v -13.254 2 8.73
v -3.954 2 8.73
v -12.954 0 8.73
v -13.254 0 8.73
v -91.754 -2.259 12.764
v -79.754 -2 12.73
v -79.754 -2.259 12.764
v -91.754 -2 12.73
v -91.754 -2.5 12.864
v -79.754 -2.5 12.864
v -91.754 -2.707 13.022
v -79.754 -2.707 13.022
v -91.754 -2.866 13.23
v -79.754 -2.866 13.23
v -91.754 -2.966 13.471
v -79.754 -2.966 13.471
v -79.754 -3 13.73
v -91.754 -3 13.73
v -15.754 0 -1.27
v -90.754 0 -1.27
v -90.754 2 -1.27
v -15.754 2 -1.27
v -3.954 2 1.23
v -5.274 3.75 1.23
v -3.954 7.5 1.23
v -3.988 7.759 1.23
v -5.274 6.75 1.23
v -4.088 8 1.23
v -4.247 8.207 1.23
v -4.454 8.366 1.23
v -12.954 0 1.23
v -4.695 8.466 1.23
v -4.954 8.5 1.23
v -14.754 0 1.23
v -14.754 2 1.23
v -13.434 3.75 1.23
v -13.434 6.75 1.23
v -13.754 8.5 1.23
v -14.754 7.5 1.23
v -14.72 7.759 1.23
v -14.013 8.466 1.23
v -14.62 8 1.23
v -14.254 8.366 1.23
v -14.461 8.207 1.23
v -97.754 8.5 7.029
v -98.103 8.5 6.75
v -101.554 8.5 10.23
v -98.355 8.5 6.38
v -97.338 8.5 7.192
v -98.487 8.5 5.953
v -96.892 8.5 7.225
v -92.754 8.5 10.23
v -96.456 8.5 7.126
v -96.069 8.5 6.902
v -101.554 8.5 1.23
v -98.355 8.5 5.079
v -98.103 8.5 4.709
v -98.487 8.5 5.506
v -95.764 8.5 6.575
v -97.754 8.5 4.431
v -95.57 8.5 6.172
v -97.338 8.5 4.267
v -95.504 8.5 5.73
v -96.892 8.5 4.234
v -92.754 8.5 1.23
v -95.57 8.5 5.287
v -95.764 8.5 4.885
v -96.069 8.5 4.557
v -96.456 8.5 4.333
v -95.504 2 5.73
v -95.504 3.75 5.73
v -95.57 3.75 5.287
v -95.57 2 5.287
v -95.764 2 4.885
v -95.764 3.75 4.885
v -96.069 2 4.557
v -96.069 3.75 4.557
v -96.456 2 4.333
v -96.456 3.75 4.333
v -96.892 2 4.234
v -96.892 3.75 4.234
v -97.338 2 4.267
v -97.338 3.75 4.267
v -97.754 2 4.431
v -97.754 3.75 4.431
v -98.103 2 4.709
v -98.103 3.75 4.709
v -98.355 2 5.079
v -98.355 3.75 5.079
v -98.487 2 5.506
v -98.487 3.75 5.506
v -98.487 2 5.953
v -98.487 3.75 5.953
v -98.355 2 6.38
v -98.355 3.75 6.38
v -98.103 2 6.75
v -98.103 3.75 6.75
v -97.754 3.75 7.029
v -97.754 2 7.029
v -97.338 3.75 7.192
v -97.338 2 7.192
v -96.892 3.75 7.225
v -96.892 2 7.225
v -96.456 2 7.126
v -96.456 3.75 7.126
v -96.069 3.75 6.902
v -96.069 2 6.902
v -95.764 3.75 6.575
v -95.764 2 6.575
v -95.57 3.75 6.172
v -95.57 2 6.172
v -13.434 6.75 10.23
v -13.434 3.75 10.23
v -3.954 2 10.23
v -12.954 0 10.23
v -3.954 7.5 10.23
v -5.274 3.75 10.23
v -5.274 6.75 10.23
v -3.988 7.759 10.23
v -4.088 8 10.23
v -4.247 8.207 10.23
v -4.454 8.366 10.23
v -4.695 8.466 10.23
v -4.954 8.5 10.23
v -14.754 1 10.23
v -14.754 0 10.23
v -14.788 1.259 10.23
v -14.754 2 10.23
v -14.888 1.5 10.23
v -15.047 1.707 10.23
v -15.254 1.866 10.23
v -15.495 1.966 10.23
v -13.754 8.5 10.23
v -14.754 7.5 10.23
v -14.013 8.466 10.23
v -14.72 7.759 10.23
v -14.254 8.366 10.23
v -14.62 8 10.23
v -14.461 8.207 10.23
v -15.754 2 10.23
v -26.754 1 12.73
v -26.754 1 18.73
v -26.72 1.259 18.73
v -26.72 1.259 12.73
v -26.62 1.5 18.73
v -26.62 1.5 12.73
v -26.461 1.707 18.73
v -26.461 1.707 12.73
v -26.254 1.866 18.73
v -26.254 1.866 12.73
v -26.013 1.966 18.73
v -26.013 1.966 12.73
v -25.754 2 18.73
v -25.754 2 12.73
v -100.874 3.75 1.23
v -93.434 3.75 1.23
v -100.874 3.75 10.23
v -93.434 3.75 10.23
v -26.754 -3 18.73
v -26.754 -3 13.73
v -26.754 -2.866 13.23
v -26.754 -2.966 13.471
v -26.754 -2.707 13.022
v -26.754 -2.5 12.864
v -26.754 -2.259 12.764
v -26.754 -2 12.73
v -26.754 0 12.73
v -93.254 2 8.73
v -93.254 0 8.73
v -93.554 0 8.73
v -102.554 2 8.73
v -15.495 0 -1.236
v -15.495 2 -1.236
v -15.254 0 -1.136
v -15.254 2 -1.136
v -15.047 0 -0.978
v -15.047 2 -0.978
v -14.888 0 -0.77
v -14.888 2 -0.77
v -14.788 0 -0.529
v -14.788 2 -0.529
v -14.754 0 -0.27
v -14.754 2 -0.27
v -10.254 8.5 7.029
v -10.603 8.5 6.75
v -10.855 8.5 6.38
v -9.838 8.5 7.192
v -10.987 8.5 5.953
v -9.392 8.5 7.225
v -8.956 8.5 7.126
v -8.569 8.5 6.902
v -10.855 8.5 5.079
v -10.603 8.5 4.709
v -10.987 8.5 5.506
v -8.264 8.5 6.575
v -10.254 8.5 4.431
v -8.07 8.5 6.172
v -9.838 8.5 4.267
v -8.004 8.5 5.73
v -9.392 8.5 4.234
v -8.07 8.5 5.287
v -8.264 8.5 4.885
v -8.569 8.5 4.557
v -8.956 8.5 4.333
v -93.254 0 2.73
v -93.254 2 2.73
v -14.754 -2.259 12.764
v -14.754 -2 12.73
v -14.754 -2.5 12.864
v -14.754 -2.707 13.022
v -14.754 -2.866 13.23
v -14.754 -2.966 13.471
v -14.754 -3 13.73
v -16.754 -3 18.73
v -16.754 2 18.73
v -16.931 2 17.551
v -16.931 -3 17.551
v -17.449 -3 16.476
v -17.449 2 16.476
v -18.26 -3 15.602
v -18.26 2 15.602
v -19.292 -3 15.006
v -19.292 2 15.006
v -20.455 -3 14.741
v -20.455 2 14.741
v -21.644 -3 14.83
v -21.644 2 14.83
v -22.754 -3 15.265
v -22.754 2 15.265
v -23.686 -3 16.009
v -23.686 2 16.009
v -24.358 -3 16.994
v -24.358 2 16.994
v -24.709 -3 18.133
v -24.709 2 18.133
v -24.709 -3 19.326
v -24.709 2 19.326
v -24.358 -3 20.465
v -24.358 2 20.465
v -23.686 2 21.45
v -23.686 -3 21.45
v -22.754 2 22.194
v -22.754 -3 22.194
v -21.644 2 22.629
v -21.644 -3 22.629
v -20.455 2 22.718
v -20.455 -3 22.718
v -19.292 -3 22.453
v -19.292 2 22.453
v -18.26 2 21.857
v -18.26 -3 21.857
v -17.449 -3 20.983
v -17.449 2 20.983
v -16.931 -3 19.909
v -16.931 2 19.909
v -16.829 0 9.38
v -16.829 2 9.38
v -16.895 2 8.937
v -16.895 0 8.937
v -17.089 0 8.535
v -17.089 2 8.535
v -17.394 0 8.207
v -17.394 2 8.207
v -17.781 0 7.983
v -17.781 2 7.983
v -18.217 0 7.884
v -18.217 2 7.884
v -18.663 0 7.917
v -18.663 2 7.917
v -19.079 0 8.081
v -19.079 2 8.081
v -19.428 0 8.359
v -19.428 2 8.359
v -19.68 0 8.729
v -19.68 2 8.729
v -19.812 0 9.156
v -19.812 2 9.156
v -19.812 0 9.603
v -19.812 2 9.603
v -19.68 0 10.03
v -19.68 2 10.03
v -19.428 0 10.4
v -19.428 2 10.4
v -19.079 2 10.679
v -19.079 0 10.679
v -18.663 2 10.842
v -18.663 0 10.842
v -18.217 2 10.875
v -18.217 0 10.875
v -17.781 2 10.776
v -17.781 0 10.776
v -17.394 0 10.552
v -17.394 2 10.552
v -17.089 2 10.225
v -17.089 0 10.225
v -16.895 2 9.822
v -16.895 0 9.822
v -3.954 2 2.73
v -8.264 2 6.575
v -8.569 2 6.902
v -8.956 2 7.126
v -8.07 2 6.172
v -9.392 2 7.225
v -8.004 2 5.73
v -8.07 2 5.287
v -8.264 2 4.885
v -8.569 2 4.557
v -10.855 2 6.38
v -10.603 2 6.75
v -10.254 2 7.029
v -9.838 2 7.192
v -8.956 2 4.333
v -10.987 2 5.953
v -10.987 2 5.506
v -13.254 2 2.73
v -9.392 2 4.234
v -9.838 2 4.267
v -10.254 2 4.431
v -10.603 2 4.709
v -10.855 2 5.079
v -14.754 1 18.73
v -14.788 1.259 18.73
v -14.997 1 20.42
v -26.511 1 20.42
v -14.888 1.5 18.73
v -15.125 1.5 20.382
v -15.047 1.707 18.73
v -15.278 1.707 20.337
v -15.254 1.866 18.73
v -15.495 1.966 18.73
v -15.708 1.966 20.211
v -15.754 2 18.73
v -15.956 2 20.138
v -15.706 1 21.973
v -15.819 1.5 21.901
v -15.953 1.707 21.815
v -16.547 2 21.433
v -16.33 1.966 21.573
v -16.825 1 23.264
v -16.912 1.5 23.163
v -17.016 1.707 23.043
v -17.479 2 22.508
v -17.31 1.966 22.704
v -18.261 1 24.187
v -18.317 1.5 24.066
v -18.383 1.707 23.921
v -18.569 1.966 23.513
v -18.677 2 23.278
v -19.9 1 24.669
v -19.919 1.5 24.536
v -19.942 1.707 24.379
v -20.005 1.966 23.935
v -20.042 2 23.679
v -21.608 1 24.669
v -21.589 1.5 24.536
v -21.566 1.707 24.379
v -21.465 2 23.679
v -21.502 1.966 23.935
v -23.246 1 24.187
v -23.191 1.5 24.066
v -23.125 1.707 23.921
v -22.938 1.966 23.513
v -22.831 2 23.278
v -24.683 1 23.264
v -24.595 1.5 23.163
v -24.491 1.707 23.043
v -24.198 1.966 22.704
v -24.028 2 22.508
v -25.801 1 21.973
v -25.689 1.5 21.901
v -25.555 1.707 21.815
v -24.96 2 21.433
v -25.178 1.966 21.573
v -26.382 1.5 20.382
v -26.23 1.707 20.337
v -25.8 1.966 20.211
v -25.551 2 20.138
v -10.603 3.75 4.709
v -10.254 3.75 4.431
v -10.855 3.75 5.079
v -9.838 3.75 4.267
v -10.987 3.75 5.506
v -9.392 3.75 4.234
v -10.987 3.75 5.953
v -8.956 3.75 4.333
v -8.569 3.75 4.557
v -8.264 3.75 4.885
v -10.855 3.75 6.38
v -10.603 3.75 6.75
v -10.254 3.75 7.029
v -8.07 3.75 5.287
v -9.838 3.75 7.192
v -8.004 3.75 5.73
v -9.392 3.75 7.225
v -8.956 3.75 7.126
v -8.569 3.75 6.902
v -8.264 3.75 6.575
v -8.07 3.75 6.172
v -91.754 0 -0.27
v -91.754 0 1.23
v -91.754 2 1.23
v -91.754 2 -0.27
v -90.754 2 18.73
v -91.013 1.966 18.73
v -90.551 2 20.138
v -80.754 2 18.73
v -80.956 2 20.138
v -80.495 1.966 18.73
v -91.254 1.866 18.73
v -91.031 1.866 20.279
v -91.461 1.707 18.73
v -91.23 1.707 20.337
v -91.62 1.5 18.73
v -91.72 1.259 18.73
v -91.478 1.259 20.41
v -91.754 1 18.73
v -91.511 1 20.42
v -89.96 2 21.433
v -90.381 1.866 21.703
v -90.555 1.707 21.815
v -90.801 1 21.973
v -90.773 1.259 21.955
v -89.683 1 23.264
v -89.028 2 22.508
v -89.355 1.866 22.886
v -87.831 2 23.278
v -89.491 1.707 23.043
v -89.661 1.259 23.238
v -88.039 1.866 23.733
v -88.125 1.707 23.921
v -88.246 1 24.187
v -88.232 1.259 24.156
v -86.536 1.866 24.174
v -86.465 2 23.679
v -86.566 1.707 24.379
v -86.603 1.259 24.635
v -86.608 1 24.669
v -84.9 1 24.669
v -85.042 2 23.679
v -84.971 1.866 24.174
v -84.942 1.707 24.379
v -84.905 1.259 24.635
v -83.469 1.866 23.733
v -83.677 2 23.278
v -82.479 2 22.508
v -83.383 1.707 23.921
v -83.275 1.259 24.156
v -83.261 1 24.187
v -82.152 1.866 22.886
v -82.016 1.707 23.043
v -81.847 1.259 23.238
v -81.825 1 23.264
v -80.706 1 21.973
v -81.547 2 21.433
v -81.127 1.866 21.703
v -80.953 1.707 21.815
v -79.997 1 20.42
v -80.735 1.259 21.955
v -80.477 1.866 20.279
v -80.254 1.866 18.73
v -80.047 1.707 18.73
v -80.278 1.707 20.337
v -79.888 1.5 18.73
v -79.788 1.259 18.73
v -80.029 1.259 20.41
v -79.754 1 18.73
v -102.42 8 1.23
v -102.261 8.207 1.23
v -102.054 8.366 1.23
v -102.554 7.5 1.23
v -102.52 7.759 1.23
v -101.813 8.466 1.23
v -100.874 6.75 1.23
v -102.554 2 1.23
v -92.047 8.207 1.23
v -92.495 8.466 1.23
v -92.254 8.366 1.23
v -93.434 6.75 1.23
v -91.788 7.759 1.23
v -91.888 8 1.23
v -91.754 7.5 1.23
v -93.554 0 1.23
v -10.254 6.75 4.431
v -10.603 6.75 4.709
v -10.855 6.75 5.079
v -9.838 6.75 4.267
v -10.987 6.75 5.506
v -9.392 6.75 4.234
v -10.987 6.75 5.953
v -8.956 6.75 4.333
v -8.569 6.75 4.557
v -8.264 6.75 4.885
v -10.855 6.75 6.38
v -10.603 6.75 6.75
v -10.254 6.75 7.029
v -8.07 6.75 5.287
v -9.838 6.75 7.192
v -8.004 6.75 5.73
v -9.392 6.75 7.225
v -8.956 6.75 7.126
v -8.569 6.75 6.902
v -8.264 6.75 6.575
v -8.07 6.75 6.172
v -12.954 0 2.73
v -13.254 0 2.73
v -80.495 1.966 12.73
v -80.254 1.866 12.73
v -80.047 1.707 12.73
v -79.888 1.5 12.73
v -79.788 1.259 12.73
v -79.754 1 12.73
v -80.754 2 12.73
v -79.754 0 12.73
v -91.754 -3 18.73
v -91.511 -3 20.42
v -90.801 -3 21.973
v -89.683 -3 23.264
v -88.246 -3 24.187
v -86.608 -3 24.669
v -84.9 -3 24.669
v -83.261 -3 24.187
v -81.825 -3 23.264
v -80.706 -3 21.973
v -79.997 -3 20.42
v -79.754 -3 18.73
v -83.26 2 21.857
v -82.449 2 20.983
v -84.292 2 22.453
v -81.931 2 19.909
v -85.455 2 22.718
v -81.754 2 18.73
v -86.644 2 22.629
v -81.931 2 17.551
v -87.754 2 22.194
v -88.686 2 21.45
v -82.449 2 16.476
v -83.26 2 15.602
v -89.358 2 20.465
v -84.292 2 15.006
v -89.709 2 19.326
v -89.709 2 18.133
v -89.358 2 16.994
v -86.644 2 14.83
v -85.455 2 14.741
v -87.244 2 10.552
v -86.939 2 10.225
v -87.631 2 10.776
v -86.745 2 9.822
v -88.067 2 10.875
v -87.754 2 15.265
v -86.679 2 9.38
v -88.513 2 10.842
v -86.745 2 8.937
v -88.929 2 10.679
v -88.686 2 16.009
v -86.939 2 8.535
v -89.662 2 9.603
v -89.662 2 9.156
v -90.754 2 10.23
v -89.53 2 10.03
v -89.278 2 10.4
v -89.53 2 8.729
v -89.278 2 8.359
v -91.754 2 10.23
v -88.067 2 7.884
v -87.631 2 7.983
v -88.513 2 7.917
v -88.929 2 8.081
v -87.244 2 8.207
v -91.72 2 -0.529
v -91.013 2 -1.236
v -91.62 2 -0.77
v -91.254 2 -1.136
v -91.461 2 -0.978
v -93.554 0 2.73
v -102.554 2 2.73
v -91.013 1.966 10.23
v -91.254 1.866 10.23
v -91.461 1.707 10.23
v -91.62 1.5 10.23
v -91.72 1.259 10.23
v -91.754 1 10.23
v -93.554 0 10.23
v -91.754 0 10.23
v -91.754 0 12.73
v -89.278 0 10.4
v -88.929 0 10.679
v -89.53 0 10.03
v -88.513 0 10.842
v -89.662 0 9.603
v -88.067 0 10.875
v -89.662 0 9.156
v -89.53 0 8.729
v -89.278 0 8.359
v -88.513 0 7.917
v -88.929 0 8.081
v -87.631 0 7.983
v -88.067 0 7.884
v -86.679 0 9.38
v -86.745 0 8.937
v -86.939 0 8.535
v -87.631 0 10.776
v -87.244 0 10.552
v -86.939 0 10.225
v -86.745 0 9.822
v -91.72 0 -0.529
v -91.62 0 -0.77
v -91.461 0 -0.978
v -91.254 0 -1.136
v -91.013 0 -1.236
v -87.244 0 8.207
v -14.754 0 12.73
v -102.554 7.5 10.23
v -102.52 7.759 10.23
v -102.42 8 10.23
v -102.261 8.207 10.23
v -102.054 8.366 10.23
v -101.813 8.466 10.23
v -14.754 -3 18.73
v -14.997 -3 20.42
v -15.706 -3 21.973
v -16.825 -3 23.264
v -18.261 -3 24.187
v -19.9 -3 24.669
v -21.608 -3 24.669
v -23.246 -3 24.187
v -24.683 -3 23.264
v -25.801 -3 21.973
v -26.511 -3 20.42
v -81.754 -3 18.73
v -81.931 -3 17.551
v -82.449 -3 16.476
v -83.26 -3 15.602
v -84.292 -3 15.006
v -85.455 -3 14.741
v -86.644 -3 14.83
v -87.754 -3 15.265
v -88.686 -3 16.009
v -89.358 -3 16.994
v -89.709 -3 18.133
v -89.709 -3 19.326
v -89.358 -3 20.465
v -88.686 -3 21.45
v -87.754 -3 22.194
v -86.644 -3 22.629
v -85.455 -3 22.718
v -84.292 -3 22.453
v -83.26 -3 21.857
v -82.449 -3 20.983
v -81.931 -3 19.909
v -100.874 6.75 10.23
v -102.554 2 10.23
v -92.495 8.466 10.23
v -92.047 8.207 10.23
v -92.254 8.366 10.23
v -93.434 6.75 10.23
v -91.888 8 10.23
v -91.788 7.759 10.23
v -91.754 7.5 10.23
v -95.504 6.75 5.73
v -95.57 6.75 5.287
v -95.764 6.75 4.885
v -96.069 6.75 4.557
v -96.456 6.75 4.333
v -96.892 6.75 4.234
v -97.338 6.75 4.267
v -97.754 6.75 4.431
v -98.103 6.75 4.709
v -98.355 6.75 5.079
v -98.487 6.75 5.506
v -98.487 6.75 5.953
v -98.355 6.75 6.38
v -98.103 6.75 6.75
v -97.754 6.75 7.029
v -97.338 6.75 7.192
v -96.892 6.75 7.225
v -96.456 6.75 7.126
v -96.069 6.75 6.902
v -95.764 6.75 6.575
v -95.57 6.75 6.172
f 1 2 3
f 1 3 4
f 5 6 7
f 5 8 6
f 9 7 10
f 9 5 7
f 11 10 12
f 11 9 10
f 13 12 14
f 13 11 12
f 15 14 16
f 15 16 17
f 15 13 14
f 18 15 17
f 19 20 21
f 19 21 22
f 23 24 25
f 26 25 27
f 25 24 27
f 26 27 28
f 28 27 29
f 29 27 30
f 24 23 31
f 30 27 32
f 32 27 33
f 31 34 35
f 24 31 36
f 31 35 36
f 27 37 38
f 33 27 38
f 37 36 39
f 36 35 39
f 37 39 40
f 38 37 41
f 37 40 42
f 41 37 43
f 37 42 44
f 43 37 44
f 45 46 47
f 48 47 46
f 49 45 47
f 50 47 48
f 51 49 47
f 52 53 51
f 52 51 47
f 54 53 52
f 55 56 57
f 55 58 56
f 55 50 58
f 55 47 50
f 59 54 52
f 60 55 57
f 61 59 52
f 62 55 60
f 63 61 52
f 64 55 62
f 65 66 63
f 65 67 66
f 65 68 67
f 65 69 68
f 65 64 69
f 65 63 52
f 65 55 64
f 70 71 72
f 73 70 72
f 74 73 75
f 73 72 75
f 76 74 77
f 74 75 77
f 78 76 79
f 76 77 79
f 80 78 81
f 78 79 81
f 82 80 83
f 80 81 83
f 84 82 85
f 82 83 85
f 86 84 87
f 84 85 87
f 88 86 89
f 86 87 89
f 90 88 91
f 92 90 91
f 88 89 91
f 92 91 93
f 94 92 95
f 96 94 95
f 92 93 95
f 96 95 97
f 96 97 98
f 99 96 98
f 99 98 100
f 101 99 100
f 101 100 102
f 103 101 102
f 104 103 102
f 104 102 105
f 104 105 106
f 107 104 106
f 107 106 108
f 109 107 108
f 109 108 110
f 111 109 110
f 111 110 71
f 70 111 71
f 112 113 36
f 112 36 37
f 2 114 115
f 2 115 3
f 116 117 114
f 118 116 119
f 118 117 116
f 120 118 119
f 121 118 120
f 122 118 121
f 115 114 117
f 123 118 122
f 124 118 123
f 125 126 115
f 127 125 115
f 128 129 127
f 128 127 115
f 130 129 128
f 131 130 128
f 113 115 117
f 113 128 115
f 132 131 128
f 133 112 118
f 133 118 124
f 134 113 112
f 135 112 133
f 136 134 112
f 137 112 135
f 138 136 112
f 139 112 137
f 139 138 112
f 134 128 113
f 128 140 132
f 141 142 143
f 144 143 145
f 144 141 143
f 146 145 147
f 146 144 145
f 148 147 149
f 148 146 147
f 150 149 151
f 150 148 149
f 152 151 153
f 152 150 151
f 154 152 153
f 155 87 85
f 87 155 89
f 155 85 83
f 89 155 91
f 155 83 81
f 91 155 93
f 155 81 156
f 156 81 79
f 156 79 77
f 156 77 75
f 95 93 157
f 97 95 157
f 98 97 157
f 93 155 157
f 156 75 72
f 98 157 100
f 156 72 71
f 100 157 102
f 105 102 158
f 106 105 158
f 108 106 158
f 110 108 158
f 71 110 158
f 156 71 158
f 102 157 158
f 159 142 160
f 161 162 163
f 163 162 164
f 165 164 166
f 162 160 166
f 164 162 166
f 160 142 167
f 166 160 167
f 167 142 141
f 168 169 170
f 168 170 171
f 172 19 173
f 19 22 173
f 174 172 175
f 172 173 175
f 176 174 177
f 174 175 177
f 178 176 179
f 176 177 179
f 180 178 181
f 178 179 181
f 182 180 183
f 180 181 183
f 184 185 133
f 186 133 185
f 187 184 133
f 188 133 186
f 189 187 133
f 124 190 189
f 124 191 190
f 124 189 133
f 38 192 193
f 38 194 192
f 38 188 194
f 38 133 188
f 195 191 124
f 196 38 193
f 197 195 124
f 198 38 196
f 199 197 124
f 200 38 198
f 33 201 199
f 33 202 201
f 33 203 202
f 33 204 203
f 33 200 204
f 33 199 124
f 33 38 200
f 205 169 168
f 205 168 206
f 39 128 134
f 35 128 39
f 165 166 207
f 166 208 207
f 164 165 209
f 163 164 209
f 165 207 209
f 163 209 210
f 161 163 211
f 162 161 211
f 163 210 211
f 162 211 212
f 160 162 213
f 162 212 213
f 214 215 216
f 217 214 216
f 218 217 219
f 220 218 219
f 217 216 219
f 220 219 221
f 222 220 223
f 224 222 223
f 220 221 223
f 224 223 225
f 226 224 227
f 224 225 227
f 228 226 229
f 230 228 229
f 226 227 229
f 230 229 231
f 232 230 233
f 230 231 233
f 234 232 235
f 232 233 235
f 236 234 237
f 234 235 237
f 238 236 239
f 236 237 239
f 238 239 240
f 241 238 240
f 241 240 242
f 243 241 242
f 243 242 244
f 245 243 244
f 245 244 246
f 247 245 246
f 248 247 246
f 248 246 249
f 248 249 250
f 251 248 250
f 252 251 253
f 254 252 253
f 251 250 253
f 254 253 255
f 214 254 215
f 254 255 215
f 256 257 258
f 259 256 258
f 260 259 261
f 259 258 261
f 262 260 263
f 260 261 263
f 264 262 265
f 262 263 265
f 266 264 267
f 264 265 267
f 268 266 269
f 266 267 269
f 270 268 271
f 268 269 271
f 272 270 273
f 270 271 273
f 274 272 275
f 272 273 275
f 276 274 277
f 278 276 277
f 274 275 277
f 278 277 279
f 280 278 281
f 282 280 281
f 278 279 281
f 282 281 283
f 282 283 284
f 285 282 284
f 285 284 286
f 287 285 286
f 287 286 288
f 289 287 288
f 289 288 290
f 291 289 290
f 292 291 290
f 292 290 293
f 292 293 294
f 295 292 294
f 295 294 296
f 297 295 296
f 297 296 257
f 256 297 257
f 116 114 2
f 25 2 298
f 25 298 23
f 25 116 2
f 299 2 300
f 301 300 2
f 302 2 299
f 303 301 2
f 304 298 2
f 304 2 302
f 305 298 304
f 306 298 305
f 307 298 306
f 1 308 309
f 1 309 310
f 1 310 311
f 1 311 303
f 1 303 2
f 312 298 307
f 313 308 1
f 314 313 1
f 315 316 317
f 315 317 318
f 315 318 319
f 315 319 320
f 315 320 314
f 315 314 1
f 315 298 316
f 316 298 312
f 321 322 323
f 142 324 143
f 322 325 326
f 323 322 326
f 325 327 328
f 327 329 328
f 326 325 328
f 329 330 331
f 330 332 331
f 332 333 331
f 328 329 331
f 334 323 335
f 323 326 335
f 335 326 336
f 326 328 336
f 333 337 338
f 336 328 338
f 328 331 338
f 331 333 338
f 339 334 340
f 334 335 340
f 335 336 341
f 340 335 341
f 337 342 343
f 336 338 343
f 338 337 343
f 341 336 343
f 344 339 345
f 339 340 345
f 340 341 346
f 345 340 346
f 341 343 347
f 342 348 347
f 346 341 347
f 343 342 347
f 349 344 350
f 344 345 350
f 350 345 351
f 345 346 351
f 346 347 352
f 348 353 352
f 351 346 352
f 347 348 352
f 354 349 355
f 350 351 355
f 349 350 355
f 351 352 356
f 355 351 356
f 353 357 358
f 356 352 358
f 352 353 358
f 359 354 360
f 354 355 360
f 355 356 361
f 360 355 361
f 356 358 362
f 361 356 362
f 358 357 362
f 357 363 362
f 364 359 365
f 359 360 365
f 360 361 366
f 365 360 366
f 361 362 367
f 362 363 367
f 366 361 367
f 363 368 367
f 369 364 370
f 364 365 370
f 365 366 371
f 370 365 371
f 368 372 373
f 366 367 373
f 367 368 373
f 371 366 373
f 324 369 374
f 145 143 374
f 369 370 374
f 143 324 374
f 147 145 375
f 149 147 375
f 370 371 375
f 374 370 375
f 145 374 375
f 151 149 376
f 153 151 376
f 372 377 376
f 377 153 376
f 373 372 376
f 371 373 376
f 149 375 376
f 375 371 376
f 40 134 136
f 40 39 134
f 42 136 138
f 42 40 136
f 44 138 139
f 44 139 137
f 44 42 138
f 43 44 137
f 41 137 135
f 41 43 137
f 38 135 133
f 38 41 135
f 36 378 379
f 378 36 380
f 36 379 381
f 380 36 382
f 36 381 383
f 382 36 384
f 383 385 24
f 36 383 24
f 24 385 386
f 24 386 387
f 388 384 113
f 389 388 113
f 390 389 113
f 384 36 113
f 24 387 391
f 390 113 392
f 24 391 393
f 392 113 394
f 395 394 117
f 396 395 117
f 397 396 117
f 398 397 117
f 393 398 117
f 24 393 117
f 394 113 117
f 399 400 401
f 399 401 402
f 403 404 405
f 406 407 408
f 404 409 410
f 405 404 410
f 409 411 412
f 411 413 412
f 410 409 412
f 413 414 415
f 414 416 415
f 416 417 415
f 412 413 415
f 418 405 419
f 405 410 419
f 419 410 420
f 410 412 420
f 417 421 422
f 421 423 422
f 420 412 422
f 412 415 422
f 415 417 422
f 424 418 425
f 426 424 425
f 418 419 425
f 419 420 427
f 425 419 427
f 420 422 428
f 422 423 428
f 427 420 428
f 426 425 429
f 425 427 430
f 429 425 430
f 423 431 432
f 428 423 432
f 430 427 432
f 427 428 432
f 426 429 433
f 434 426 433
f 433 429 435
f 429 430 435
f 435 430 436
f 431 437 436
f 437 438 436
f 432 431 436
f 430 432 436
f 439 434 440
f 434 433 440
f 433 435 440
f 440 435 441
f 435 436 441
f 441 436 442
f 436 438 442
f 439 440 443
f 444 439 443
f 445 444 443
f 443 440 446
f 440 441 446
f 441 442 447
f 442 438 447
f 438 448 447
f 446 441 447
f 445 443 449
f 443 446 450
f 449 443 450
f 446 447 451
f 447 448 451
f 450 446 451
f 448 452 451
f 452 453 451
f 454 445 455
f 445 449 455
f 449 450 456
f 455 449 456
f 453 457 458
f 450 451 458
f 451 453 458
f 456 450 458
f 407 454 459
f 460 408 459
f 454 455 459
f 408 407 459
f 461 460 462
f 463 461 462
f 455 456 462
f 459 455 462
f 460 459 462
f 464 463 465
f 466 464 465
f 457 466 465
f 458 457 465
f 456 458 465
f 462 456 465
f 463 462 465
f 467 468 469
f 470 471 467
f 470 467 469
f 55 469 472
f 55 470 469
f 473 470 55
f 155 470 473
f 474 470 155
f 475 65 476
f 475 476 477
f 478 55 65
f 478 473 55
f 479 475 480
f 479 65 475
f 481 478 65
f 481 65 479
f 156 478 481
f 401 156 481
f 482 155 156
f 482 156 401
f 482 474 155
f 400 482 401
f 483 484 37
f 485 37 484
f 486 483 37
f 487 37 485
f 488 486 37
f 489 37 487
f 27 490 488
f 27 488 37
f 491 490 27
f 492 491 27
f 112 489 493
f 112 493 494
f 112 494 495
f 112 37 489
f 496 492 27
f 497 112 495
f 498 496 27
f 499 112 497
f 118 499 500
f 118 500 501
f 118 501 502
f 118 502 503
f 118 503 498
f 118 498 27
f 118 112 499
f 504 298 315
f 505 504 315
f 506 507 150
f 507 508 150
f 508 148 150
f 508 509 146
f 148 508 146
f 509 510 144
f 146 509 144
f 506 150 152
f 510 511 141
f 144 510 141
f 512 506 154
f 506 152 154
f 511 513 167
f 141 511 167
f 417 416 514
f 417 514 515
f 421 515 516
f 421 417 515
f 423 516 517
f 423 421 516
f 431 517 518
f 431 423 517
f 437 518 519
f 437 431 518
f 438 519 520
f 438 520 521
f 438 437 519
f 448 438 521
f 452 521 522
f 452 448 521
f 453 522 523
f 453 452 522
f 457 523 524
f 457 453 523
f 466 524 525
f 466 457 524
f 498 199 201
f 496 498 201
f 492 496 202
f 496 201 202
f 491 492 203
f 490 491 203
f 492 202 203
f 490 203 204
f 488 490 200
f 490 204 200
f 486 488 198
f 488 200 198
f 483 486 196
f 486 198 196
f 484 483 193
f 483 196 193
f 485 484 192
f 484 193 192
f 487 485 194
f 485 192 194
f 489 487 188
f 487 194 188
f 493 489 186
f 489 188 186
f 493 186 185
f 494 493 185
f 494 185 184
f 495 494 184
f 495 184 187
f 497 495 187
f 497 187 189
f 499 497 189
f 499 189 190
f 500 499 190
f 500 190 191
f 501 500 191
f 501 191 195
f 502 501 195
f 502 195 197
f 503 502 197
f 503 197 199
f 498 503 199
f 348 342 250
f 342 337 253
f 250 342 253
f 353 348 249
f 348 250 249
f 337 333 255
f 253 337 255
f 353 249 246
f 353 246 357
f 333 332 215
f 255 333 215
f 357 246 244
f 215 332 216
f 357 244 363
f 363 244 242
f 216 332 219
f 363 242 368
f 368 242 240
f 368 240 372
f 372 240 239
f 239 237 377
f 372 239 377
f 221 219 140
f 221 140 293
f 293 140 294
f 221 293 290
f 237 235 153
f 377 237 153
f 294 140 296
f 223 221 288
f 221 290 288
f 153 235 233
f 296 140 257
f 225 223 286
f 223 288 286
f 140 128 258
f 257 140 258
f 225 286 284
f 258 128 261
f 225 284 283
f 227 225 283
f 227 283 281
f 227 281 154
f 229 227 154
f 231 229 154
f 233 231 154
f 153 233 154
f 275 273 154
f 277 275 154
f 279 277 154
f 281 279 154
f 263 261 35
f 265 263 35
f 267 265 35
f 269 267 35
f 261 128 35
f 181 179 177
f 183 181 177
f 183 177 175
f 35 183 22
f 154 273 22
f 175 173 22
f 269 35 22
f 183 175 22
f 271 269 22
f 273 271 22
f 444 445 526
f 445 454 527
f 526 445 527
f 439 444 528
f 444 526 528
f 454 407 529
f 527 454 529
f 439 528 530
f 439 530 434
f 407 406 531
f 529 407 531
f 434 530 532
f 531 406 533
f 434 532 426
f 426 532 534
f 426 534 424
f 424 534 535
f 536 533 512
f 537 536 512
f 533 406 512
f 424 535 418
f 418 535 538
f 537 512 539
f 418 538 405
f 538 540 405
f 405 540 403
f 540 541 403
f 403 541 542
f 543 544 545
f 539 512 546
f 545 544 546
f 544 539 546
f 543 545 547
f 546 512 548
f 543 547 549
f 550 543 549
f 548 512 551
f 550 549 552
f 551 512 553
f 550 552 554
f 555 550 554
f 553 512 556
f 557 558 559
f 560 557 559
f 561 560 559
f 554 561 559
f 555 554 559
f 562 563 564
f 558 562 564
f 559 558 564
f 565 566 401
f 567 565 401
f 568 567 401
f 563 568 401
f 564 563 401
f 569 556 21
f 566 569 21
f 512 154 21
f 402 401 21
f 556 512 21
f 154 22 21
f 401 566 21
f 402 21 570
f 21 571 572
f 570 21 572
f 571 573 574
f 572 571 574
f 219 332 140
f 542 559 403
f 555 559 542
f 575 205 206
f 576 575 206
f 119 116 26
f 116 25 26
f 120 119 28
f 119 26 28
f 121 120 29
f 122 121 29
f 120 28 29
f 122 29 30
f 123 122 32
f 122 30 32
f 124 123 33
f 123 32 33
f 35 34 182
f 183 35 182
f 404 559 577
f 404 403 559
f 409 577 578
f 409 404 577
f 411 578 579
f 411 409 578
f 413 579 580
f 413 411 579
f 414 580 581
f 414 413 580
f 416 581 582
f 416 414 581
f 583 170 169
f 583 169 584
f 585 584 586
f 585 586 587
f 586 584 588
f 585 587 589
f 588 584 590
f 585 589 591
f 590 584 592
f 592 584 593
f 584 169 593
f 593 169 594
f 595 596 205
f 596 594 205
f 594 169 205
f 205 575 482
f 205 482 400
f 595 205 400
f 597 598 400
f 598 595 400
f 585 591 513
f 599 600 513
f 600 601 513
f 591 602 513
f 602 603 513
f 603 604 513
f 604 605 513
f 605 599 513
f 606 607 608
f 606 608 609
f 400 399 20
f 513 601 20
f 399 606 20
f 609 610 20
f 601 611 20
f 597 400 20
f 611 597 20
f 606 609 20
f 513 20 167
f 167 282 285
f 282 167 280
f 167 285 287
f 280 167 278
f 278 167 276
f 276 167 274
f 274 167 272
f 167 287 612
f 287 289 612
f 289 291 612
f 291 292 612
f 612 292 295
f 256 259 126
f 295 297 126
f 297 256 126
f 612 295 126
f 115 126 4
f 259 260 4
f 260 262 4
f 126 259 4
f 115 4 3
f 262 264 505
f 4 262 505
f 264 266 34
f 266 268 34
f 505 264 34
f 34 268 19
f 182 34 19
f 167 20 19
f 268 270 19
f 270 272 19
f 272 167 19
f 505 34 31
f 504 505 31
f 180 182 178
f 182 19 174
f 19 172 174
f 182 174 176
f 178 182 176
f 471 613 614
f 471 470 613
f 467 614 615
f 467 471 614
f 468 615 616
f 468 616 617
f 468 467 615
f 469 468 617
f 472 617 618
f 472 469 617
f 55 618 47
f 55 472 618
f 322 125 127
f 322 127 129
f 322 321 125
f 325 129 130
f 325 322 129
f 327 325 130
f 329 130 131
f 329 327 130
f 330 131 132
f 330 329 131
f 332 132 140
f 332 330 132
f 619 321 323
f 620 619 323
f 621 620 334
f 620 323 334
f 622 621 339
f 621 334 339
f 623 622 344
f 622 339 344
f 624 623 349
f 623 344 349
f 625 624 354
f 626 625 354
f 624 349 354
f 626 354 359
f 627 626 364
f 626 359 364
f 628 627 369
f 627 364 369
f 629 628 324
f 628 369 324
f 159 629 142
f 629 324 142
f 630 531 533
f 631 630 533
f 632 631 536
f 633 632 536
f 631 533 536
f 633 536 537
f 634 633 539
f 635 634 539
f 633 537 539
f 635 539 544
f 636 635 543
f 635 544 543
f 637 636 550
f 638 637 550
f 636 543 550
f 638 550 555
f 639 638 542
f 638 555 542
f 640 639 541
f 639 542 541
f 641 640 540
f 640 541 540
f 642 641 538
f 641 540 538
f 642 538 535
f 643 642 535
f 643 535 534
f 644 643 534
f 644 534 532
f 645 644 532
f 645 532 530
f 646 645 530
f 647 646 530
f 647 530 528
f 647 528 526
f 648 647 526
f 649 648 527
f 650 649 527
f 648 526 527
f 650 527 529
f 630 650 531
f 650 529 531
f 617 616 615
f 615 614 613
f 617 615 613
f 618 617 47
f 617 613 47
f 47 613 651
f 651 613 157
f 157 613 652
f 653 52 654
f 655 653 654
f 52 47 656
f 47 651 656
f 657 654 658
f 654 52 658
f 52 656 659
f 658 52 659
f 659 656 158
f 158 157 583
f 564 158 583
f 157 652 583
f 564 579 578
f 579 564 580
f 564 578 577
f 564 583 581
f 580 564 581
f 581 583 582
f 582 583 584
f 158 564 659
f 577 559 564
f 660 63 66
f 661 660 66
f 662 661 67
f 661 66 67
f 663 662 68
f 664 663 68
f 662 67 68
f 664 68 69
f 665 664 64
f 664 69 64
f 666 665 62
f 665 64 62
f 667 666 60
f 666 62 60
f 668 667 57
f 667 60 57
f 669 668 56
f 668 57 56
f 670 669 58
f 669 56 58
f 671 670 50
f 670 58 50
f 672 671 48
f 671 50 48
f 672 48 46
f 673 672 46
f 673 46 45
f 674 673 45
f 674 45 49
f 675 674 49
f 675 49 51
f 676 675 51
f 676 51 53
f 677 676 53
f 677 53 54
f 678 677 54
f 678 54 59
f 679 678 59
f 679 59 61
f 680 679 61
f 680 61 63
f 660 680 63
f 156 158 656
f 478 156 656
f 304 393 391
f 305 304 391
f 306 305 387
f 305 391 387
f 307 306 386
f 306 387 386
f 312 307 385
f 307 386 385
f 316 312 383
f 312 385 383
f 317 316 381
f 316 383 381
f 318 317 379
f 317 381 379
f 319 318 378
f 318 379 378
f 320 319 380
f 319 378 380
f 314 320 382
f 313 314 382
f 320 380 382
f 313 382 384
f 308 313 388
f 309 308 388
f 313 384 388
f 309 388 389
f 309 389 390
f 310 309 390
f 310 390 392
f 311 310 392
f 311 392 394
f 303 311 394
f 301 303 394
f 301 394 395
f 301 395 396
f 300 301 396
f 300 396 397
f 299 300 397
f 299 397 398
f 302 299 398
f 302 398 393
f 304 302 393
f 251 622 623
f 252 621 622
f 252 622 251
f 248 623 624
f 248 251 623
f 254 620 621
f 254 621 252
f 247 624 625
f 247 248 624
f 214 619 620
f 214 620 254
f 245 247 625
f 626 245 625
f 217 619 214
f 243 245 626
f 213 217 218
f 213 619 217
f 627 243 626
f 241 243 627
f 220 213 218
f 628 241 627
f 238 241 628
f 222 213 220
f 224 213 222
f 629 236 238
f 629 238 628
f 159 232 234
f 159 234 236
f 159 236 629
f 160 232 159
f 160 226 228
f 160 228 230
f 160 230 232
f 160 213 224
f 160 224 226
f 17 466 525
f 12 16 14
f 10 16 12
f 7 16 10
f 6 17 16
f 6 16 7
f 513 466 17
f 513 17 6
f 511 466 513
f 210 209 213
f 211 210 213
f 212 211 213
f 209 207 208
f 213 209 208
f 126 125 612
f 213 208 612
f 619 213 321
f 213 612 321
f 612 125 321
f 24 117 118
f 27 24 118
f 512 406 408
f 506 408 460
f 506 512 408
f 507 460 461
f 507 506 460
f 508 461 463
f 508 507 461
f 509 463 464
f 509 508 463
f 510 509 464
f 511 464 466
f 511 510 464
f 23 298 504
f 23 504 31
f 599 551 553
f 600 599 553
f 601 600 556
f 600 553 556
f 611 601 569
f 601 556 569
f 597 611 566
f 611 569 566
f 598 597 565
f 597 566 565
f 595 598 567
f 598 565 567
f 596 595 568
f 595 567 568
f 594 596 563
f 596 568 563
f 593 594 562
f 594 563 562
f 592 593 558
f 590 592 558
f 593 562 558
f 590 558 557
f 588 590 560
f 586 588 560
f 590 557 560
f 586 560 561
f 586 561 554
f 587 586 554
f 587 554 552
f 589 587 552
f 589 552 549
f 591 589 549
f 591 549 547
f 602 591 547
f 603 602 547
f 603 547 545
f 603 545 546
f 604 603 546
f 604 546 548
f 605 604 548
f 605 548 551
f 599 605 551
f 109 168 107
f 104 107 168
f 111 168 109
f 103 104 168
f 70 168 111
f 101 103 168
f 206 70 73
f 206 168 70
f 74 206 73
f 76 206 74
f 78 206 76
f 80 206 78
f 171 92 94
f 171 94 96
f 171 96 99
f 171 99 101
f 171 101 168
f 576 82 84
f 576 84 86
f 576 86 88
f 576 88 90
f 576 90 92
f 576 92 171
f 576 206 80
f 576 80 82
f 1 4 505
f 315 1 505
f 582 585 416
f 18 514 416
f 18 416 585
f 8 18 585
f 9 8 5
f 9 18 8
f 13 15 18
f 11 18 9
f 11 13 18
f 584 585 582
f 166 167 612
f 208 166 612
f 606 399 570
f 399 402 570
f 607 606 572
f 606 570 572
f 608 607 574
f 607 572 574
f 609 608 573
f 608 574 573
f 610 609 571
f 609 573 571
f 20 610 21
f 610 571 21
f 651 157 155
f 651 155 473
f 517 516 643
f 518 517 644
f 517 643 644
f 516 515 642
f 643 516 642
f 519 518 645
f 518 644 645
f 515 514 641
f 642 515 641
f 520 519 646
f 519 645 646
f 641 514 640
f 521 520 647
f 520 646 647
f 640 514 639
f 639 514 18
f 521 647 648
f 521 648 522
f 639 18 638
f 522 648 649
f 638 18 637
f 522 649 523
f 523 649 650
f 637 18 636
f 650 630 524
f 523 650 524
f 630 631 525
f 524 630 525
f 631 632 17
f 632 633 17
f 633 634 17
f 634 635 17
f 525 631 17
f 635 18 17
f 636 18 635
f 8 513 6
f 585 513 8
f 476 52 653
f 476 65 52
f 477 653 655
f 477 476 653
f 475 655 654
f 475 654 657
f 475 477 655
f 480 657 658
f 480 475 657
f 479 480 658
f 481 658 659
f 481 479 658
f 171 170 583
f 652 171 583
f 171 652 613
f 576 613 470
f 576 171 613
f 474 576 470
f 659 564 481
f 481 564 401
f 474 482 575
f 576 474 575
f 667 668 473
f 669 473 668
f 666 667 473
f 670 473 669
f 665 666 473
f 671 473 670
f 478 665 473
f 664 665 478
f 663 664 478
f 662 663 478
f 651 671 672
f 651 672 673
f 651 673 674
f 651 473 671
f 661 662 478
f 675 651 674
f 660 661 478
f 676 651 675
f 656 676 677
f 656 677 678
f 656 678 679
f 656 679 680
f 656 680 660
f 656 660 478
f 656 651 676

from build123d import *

# Parameters (mm, degrees)
SKETCH1_W           = 77
SKETCH1_H           = 14
BOSS_EXTRUDE1_DEPTH = 2
SKETCH3_W           = 9
SKETCH3_H           = 2
BOSS_EXTRUDE2_DEPTH = 10.8
SKETCH4_W           = 9
SKETCH4_H           = 2
BOSS_EXTRUDE3_DEPTH = 10.8
SKETCH5_W           = 10.8
SKETCH5_H           = 9
BOSS_EXTRUDE4_DEPTH = 6.5
SKETCH6_W           = 8.16
SKETCH6_H           = 3
SKETCH6_W_2         = 7.44
CUT_EXTRUDE1_DEPTH  = 9
SKETCH8_R           = 1.5
CUT_EXTRUDE2_DEPTH  = 8.5
SKETCH10_W          = 9.3
SKETCH10_H          = 6
CUT_EXTRUDE4_DEPTH  = 2
CHAMFER1_SIZE       = 9
CHAMFER1_SIZE2      = 2
BOSS_EXTRUDE5_DEPTH = 5
SKETCH13_R          = 4
CUT_EXTRUDE5_DEPTH  = 5
FILLET3_R           = 1


with BuildPart() as part:
    # Sketch1 → Boss-Extrude1 (new body)
    with BuildSketch(Plane(origin=(0, 0, 0), x_dir=(1, 0, 0), z_dir=(0, 1, 0))):
        with Locations((-53.253755964, -5.729579977)):
            Rectangle(SKETCH1_W, SKETCH1_H)
    extrude(amount=BOSS_EXTRUDE1_DEPTH)

    # Sketch3 → Boss-Extrude2 (add)
    with BuildSketch(Plane.ZY.offset(91.753755964)):
        with Locations((5.729579977, 1)):
            Rectangle(SKETCH3_W, SKETCH3_H)
    extrude(amount=BOSS_EXTRUDE2_DEPTH)

    # Sketch4 → Boss-Extrude3 (add)
    with BuildSketch(Plane(origin=(-14.753755964, 0, 0), x_dir=(0, 0, -1), z_dir=(1, 0, 0))):
        with Locations((-5.729579977, 1)):
            Rectangle(SKETCH4_W, SKETCH4_H)
    extrude(amount=BOSS_EXTRUDE3_DEPTH)

    # Sketch5 → Boss-Extrude4 (add)
    with BuildSketch(Plane(origin=(0, 2, 0), x_dir=(1, 0, 0), z_dir=(0, 1, 0))):
        with Locations((-97.153755964, -5.729579977)):
            Rectangle(SKETCH5_W, SKETCH5_H)
        with Locations((-9.353755964, -5.729579977)):
            Rectangle(SKETCH5_W, SKETCH5_H)
    extrude(amount=BOSS_EXTRUDE4_DEPTH)

    # Sketch6 → Cut-Extrude1 (cut)
    with BuildSketch(Plane.XY.offset(10.229579977)):
        with Locations((-9.353755964, 5.25)):
            Rectangle(SKETCH6_W, SKETCH6_H)
        with Locations((-97.153755964, 5.25)):
            Rectangle(SKETCH6_W_2, SKETCH6_H)
    extrude(amount=-CUT_EXTRUDE1_DEPTH, mode=Mode.SUBTRACT)

    # Sketch8 → Cut-Extrude2 (cut)
    with BuildSketch(Plane(origin=(0, 8.5, 0), x_dir=(1, 0, 0), z_dir=(0, 1, 0))):
        with Locations((-88.178755964, -9.379579977)):
            Circle(SKETCH8_R)
        with Locations((-18.328755964, -9.379579977)):
            Circle(SKETCH8_R)
        with Locations((-97.003755964, -5.729579977)):
            Circle(SKETCH8_R)
        with Locations((-9.503755964, -5.729579977)):
            Circle(SKETCH8_R)
    extrude(amount=-CUT_EXTRUDE2_DEPTH, mode=Mode.SUBTRACT)

    # Sketch10 → Cut-Extrude4 (cut)
    with BuildSketch(Plane(origin=(0, 0, 0), x_dir=(-1, 0, 0), z_dir=(0, -1, 0))):
        with Locations((97.903755964, -5.729579977)):
            Rectangle(SKETCH10_W, SKETCH10_H)
        with Locations((8.603755964, -5.729579977)):
            Rectangle(SKETCH10_W, SKETCH10_H)
    extrude(amount=-CUT_EXTRUDE4_DEPTH, mode=Mode.SUBTRACT)

    # Chamfer1
    chamfer1_edges = [part.edges().sort_by_distance(p)[0] for p in [
        (-102.553755964, 0, 1.979579977),
        (-3.953755964, 0, 9.479579977),
        (-3.953755964, 0, 1.979579977),
        (-102.553755964, 0, 9.479579977),
    ]]
    chamfer1_side = [part.faces().sort_by_distance(p)[0] for p in [
        (-53.253755964, 0, 5.684579251),
    ]]
    chamfer(chamfer1_edges, length=CHAMFER1_SIZE, length2=CHAMFER1_SIZE2, reference=chamfer1_side[0])

    # Sketch12 → Boss-Extrude5 (add)
    with BuildSketch(Plane(origin=(0, 2, 0), x_dir=(1, 0, 0), z_dir=(0, 1, 0))):
        with BuildLine():
            Line((-26.753755964, -12.729579977), (-14.753755964, -12.729579977))
            Line((-14.753755964, -12.729579977), (-14.753755964, -18.729579977))
            ThreePointArc((-14.753755964, -18.729579977), (-20.753755964, -24.729579977), (-26.753755964, -18.729579977))
            Line((-26.753755964, -18.729579977), (-26.753755964, -12.729579977))
        make_face()
        with BuildLine():
            Line((-91.753755964, -12.729579977), (-91.753755964, -18.729579977))
            ThreePointArc((-91.753755964, -18.729579977), (-85.753755964, -24.729579977), (-79.753755964, -18.729579977))
            Line((-79.753755964, -18.729579977), (-79.753755964, -12.729579977))
            Line((-79.753755964, -12.729579977), (-91.753755964, -12.729579977))
        make_face()
    extrude(amount=-BOSS_EXTRUDE5_DEPTH)

    # Sketch13 → Cut-Extrude5 (cut)
    with BuildSketch(Plane(origin=(0, 2, 0), x_dir=(1, 0, 0), z_dir=(0, 1, 0))):
        with Locations((-85.753755964, -18.729579977)):
            Circle(SKETCH13_R)
        with Locations((-20.753755964, -18.729579977)):
            Circle(SKETCH13_R)
    extrude(amount=-CUT_EXTRUDE5_DEPTH, mode=Mode.SUBTRACT)

    # Fillet3
    fillet3_edges = [part.edges().sort_by_distance(p)[0] for p in [
        (-85.753755964, -3, 12.729579977),
        (-85.753755964, 2, 24.729579977),
        (-79.753755964, 2, 15.729579977),
        (-20.753755964, -3, 12.729579977),
        (-20.753755964, 2, 24.729579977),
        (-26.753755964, 2, 15.729579977),
        (-91.753755964, 8.5, 5.729579977),
        (-102.553755964, 8.5, 5.729579977),
        (-14.753755964, 8.5, 5.729579977),
        (-3.953755964, 8.5, 5.729579977),
        (-91.753755964, 1, -1.270420023),
        (-14.753755964, 1, -1.270420023),
    ]]
    fillet(fillet3_edges, radius=FILLET3_R)


solid = part.part
